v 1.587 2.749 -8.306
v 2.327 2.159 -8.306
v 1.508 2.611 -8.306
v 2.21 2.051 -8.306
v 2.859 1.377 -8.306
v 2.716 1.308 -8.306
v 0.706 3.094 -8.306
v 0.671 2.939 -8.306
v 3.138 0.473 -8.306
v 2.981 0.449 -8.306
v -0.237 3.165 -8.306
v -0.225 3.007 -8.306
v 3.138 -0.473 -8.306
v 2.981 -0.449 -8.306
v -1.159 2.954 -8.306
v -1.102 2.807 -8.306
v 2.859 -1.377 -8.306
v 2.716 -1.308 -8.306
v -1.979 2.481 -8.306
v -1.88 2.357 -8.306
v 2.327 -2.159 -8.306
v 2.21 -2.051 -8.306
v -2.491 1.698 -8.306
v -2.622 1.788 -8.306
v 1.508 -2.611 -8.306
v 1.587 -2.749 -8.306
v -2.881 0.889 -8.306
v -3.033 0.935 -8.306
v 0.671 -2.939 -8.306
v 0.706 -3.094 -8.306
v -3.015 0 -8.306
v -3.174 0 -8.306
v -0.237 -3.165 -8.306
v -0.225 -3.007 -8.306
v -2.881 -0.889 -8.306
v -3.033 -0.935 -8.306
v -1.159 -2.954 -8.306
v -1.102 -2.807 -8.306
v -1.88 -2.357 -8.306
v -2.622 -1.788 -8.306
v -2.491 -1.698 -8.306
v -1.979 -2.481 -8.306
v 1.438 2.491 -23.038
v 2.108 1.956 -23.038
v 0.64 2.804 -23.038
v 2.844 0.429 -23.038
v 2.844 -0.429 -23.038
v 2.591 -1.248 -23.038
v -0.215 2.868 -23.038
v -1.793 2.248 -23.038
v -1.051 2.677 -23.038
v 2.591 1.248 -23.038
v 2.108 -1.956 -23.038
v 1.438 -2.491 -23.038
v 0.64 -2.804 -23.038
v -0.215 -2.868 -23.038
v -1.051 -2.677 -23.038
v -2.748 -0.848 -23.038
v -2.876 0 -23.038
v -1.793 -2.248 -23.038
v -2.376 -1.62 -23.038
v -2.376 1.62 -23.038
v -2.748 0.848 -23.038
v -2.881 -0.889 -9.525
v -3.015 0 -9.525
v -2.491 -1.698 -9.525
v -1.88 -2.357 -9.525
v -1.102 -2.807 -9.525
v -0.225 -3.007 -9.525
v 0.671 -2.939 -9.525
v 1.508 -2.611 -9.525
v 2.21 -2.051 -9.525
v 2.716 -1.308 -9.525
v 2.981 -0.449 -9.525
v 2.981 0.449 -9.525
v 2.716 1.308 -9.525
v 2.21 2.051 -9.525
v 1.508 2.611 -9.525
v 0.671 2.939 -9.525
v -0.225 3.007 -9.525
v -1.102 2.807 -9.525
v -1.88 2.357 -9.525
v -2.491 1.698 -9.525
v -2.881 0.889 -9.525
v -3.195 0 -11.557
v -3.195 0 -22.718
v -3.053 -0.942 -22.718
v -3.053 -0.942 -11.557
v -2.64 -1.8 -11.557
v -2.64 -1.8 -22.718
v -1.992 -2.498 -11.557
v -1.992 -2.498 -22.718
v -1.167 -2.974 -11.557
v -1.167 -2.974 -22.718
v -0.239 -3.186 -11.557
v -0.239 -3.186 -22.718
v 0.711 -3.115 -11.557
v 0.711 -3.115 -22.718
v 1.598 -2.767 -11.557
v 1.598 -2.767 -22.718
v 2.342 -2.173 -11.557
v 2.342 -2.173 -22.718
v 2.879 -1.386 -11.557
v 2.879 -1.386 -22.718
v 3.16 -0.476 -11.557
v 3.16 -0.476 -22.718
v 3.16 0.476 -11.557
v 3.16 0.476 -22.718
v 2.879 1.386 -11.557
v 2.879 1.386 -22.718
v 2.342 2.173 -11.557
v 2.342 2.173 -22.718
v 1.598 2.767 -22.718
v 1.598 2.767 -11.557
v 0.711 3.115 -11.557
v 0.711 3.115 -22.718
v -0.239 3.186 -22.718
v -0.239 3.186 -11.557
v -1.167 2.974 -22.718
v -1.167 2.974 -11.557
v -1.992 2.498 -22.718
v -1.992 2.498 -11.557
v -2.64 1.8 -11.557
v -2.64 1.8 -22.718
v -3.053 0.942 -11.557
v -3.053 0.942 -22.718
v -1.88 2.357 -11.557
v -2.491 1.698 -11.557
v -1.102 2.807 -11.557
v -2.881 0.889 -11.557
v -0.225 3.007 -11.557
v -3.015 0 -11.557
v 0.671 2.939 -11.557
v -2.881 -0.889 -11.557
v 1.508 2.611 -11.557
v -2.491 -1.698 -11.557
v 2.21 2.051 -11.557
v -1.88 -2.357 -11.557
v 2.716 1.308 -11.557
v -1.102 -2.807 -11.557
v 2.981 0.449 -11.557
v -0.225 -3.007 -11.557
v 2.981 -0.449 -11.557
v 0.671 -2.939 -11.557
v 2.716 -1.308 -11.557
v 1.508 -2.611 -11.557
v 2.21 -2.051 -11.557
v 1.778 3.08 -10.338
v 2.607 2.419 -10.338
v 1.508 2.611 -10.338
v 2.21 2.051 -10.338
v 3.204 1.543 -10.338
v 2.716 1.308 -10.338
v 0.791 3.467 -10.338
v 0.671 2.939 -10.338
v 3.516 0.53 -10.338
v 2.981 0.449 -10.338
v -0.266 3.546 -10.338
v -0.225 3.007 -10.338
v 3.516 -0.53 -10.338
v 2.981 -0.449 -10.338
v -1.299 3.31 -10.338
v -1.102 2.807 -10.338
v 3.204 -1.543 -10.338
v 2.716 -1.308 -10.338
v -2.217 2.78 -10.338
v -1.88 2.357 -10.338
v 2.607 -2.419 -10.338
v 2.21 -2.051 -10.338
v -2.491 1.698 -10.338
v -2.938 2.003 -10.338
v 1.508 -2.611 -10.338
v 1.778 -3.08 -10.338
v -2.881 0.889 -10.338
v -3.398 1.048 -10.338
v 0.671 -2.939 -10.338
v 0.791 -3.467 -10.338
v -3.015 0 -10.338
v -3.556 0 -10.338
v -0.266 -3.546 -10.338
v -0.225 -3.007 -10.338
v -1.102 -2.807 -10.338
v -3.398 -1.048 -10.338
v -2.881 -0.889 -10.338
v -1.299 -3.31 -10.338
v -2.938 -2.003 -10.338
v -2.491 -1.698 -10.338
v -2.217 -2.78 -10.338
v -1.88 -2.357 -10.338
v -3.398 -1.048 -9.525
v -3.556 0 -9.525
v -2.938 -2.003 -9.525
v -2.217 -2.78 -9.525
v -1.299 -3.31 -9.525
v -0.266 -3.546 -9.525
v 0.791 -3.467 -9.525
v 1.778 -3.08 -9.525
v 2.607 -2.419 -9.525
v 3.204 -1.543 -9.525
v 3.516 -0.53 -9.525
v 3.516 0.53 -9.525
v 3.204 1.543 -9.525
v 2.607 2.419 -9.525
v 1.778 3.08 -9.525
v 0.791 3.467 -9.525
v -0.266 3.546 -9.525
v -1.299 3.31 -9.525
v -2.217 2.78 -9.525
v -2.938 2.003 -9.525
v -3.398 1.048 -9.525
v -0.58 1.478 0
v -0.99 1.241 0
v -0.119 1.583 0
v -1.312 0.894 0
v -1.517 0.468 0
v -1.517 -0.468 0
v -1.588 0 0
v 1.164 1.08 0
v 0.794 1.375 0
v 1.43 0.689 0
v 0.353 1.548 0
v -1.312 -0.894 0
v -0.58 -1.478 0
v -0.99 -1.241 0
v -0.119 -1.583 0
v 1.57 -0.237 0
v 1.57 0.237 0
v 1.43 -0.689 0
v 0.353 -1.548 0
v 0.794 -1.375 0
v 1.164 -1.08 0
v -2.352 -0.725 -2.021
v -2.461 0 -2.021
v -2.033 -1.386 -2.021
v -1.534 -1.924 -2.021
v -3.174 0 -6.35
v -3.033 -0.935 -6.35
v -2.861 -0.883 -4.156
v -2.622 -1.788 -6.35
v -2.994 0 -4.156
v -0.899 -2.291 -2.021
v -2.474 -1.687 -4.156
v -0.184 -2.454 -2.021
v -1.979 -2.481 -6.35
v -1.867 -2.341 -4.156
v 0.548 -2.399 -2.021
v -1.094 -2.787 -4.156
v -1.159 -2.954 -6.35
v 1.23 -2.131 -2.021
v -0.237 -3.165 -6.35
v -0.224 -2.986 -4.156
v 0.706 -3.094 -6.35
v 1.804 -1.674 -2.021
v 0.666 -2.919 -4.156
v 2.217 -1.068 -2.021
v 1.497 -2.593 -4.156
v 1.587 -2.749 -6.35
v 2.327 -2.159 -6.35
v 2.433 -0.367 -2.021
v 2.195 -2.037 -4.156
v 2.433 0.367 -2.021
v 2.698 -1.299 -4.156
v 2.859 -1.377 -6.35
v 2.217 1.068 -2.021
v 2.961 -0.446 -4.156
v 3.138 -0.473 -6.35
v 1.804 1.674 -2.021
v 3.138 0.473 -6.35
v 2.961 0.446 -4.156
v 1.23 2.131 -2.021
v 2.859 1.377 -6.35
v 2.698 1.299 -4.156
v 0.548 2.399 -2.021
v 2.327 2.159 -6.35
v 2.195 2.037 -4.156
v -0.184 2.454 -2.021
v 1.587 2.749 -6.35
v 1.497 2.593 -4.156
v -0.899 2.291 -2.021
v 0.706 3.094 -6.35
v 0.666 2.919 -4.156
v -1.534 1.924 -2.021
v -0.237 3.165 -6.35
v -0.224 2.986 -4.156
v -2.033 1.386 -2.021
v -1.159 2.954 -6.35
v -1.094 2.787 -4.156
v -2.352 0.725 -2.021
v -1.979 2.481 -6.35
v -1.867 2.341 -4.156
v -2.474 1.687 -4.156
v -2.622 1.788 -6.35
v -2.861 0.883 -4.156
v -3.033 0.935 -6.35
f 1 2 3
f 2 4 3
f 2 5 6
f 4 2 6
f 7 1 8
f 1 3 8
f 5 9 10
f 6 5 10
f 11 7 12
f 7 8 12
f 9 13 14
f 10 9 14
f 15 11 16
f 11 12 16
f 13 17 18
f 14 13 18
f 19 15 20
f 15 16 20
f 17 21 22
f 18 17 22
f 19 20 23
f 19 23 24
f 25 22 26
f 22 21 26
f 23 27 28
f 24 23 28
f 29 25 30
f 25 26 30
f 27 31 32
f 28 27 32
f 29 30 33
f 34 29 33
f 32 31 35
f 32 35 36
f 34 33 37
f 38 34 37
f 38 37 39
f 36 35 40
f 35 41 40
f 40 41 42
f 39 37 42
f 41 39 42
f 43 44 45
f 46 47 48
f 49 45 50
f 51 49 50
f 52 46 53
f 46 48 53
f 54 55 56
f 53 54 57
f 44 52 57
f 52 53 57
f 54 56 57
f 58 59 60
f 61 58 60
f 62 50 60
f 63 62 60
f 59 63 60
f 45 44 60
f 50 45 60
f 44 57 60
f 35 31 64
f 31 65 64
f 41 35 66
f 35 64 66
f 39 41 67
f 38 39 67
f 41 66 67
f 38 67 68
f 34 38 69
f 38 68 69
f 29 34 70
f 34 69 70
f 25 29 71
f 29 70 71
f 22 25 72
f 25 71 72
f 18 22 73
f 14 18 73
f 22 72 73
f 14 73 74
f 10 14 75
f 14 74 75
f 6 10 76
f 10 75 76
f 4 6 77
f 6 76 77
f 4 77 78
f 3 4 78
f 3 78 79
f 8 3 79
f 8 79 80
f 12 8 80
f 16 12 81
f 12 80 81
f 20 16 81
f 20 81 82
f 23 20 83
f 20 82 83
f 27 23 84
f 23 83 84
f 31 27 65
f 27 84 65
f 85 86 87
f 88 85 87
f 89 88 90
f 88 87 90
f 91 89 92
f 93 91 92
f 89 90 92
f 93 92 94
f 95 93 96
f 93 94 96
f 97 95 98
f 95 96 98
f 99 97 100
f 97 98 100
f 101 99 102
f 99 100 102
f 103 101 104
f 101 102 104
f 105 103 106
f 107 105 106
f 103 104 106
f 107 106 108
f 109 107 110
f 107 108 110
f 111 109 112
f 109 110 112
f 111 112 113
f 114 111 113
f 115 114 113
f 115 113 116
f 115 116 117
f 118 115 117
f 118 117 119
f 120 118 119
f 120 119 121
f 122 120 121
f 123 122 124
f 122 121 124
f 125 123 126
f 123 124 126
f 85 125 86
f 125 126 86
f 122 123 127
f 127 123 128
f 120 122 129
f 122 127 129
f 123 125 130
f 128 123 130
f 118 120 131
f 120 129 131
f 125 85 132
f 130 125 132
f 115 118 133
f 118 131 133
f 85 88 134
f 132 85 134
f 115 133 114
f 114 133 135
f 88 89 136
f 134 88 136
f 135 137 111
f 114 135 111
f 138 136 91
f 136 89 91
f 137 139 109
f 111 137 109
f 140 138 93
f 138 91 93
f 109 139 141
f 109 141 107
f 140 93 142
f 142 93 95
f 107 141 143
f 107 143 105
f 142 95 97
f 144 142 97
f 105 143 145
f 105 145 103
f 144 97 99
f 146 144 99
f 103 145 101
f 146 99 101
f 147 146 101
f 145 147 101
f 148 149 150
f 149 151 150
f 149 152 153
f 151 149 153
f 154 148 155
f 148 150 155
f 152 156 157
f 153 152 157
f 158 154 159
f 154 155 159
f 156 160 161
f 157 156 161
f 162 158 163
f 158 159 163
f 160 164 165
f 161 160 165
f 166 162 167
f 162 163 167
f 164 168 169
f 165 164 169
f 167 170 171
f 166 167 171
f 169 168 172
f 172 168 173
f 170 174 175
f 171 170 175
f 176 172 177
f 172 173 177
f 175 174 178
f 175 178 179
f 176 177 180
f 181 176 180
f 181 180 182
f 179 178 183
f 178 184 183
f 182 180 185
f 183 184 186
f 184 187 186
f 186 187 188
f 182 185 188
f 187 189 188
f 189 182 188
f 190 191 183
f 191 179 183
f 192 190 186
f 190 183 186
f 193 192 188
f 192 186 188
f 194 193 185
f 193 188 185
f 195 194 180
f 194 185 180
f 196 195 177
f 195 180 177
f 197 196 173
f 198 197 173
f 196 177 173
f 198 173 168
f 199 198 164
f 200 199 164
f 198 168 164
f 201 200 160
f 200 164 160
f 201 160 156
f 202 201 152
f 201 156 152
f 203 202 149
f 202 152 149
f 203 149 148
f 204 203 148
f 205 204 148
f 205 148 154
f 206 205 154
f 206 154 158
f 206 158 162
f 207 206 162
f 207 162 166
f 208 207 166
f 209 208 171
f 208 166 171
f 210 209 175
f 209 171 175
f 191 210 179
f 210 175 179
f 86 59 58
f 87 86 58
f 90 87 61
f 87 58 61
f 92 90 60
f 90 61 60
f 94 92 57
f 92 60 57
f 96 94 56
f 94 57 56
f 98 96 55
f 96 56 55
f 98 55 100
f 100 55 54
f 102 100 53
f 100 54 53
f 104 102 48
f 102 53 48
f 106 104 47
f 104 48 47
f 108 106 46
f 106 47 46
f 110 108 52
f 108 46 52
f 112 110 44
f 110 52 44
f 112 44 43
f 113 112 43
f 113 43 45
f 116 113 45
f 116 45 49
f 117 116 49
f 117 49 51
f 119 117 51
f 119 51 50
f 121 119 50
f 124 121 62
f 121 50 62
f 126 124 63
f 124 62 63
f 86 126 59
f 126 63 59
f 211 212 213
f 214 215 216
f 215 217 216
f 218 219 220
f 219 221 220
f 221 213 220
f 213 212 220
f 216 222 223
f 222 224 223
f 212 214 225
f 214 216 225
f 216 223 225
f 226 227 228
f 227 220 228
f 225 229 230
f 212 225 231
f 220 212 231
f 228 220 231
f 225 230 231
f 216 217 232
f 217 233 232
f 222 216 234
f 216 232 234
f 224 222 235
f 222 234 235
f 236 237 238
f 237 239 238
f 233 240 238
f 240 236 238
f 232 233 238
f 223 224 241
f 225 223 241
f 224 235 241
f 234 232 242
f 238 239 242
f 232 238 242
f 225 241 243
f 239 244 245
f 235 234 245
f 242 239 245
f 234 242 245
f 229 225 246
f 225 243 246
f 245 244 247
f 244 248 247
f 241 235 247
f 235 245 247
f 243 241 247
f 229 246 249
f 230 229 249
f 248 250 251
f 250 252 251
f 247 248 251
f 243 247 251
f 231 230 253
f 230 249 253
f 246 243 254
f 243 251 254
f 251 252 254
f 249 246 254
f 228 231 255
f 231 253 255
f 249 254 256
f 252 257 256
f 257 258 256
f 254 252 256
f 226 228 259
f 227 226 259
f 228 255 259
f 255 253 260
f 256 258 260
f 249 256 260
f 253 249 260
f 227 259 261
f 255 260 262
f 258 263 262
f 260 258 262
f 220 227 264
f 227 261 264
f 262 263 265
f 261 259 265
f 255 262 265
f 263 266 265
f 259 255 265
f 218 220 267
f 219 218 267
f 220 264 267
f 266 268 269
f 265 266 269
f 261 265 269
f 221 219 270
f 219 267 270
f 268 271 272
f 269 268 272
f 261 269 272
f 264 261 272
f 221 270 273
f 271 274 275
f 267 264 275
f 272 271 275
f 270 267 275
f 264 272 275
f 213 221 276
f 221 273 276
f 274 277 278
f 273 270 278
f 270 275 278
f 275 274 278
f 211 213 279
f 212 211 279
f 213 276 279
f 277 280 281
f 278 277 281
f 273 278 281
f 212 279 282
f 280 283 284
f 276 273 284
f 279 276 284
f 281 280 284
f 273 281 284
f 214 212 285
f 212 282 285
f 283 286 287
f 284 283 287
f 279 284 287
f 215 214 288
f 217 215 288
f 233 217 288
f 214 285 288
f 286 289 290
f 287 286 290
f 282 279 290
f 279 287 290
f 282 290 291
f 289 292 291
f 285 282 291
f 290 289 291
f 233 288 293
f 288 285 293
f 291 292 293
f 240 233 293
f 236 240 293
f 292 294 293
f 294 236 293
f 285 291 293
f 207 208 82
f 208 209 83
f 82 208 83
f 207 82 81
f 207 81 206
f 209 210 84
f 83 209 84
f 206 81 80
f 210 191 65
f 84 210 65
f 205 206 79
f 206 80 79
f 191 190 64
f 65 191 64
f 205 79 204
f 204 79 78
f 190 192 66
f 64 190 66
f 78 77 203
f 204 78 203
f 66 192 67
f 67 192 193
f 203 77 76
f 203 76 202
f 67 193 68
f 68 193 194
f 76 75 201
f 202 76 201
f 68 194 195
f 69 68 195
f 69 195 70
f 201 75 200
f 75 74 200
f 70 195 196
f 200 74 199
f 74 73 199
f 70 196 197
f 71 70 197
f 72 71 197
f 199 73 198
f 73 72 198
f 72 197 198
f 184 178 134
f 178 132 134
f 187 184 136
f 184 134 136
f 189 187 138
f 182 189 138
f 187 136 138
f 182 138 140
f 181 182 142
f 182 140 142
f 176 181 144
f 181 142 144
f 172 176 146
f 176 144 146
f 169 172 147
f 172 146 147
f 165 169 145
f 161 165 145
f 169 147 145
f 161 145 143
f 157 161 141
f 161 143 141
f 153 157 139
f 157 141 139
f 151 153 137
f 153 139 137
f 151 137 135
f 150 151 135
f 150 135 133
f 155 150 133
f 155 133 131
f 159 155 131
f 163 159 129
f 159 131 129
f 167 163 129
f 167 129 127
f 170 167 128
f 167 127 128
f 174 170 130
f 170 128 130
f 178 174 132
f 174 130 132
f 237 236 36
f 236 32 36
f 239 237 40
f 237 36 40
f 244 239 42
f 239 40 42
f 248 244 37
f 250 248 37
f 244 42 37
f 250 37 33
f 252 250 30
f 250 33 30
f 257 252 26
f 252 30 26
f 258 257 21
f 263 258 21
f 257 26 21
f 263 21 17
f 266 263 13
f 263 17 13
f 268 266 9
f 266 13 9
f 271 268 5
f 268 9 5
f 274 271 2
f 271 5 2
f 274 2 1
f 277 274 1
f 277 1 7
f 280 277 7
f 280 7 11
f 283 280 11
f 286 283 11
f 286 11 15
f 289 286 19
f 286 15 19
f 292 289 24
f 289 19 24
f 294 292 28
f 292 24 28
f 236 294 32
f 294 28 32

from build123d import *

# Parameters (mm, degrees)
CHAMFER1_SIZE = 0.319532


with BuildPart() as part:
    # Sketch2 → Revolve1 (revolve)
    with BuildSketch(Plane(origin=(0, 0, 0), x_dir=(0, 0, -1), z_dir=(1, 0, 0)), mode=Mode.PRIVATE) as revolve1_sk:
        with BuildLine():
            Line((0, 0), (0, 1.5875))
            ThreePointArc((0, 1.5875), (3.077438862, 2.771171998), (6.35, 3.17373))
            Line((6.35, 3.17373), (8.3058, 3.17373))
            Line((8.3058, 3.17373), (8.3058, 3.0150435))
            Line((8.3058, 3.0150435), (9.525, 3.0150435))
            Line((9.525, 3.0150435), (9.525, 3.556))
            Line((9.525, 3.556), (10.3378, 3.556))
            Line((10.3378, 3.556), (10.3378, 3.0150435))
            Line((10.3378, 3.0150435), (11.557, 3.0150435))
            Line((11.557, 3.0150435), (11.557, 3.19532))
            Line((11.557, 3.19532), (23.0378, 3.19532))
            Line((23.0378, 3.19532), (23.0378, 0))
            Line((23.0378, 0), (0, 0))
        make_face()
    revolve(revolve1_sk.sketch.rotate(Axis((0, 0, 0), (0, 0, 1)), 90), axis=Axis((0, 0, 0), (0, 0, 1)))

    # Chamfer1
    chamfer1_edges = [part.edges().sort_by_distance(p)[0] for p in [
        (3.19532, 0, -23.0378),
    ]]
    chamfer(chamfer1_edges, length=CHAMFER1_SIZE)


solid = part.part
